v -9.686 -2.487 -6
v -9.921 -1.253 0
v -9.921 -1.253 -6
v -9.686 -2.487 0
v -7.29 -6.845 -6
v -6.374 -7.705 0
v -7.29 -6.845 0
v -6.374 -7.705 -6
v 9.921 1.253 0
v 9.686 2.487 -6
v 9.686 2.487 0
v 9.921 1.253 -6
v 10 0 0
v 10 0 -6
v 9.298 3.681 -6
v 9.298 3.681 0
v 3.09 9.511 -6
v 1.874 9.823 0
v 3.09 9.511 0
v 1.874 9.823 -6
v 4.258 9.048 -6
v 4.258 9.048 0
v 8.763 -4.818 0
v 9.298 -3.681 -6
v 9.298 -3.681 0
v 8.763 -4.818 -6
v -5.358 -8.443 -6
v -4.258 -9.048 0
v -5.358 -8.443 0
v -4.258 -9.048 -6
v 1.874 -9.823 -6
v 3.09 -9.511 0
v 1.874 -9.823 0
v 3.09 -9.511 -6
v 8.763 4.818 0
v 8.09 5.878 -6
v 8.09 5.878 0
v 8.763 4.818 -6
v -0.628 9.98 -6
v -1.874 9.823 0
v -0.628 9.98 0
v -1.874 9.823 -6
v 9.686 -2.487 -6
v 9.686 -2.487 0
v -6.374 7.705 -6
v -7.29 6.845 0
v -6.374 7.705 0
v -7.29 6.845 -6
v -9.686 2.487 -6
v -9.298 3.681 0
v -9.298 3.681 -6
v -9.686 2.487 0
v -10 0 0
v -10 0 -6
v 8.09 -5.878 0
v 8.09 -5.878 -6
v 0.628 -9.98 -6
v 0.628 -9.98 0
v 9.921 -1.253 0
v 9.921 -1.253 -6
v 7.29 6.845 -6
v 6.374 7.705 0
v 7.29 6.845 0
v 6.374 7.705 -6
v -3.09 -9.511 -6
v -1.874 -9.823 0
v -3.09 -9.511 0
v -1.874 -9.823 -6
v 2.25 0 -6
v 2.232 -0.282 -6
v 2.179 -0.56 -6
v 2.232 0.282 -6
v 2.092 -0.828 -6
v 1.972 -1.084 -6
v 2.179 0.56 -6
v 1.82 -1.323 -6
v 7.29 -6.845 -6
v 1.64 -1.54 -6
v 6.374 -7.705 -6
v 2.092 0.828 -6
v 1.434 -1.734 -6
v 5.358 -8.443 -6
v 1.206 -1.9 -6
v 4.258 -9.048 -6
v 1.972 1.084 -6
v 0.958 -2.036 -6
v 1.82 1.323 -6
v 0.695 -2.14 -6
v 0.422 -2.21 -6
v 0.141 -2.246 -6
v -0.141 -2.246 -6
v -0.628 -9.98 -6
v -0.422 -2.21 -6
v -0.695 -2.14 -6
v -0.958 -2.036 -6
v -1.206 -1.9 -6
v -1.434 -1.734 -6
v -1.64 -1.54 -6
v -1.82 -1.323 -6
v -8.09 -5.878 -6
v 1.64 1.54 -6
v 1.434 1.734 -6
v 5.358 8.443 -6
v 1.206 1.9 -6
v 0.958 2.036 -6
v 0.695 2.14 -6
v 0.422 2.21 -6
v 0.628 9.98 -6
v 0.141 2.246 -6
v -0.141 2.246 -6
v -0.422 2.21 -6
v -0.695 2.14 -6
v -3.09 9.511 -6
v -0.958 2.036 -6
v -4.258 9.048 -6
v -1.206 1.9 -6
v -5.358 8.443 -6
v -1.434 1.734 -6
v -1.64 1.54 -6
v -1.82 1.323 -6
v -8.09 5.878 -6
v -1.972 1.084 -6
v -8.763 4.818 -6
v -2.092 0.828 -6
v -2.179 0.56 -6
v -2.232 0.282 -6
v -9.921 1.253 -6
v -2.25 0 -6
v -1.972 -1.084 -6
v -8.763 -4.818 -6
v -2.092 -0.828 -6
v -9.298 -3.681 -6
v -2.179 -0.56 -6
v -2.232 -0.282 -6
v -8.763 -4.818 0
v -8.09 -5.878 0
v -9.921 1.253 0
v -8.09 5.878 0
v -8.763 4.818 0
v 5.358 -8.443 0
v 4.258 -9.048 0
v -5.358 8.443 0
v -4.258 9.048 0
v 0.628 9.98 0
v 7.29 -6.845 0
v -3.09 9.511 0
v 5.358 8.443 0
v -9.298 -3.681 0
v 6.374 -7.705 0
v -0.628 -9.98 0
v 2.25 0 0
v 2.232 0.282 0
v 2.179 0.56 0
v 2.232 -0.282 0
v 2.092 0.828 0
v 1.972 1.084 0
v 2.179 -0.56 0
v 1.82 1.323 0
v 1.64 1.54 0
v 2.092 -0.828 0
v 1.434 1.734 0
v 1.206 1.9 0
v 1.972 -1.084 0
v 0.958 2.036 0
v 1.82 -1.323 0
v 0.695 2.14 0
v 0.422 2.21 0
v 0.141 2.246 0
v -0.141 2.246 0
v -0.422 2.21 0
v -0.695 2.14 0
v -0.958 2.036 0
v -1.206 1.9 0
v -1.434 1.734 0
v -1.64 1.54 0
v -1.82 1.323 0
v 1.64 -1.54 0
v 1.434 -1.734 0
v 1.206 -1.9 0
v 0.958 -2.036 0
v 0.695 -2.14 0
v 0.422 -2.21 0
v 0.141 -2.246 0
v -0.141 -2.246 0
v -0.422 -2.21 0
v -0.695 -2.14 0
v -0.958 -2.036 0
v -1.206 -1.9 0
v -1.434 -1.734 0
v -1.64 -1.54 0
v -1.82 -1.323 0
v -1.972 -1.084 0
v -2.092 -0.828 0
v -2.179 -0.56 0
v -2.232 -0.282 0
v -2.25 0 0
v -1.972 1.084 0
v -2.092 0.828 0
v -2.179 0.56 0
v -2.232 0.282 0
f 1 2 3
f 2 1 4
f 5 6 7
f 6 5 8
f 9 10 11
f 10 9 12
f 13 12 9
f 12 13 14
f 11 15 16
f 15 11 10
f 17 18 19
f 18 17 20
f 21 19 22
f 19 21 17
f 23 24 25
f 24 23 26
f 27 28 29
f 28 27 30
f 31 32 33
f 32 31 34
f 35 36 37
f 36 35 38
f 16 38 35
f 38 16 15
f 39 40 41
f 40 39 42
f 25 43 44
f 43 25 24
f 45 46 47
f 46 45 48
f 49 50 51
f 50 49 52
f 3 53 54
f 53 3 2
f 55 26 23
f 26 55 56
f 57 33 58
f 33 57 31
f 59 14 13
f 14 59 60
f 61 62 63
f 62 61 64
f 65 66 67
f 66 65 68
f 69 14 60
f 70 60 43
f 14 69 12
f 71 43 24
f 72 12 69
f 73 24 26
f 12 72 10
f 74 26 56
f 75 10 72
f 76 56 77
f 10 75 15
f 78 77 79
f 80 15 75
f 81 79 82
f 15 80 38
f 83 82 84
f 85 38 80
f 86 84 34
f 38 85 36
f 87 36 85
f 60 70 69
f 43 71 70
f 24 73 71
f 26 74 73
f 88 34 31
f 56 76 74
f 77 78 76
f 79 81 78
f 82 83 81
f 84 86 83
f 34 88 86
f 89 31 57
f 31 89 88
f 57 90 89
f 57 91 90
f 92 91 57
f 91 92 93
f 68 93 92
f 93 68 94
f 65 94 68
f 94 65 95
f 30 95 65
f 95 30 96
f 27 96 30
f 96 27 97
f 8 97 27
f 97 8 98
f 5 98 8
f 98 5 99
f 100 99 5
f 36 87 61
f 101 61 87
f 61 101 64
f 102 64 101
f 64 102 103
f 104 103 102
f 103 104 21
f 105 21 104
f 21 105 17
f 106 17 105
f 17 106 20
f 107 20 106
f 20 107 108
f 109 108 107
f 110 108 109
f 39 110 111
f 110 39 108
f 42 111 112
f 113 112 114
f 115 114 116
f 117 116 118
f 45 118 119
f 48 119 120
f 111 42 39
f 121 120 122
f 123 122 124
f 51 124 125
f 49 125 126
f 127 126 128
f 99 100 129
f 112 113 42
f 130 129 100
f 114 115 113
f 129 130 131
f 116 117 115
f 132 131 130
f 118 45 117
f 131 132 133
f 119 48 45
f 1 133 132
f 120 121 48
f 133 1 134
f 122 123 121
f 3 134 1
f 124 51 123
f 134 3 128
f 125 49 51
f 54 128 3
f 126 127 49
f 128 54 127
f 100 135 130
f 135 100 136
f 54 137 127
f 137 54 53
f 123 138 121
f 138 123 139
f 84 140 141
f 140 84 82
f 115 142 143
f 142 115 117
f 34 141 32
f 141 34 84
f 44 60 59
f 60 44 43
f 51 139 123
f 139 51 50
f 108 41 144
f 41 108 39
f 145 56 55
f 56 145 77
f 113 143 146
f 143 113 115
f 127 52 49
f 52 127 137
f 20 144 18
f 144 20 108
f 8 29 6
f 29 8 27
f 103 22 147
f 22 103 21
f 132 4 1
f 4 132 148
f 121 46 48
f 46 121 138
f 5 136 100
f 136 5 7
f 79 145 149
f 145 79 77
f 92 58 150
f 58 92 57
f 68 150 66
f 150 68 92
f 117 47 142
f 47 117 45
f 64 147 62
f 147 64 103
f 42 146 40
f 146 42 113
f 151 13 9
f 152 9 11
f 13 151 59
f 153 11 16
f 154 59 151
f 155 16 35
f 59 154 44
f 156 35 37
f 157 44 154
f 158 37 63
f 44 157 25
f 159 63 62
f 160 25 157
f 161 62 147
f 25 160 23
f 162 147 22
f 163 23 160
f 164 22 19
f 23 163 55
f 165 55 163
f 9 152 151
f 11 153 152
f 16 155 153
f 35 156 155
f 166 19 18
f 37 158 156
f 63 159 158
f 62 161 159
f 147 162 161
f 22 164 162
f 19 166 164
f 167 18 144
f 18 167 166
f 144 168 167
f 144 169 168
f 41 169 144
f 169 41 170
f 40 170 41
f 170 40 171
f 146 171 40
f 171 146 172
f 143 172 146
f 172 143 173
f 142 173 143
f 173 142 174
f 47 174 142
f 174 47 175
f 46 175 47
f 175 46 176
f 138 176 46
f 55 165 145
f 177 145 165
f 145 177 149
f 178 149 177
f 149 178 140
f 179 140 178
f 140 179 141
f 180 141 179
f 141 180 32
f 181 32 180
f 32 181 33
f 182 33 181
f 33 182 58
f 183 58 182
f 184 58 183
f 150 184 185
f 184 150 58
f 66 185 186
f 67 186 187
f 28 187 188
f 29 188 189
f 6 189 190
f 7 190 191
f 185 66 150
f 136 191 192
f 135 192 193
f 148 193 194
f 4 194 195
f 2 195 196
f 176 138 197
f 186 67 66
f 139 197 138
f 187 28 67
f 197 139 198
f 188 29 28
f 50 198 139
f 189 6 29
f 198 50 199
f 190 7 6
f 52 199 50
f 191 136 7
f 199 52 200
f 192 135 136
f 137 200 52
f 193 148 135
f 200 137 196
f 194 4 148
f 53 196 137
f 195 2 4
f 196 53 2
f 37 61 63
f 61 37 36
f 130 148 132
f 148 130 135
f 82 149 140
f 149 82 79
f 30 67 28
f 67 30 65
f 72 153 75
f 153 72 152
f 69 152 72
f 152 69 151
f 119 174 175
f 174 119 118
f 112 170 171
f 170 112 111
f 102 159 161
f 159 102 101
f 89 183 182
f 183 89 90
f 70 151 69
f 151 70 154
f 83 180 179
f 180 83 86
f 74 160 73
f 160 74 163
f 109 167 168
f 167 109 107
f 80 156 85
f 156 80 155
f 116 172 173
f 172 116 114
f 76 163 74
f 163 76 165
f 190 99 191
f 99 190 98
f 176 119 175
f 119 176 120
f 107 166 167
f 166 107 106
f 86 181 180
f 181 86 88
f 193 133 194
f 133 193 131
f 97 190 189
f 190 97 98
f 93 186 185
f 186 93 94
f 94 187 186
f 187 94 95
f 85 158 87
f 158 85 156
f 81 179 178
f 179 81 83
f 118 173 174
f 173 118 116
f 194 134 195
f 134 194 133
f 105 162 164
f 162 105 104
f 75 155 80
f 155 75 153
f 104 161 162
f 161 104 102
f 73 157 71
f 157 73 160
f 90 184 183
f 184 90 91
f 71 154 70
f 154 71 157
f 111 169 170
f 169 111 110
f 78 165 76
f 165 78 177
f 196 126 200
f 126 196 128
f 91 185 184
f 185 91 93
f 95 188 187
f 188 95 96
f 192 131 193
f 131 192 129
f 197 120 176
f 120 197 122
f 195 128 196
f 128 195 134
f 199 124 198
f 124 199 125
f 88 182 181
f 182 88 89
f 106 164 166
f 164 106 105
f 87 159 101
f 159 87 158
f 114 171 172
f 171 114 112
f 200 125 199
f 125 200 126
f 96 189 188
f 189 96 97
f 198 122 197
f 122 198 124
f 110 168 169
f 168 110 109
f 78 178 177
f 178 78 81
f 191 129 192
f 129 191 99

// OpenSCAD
$fn = 50;


difference() {
	union() {
		translate(v = [0, 0, -6.0000000000]) {
			cylinder(h = 6, r = 10.0000000000);
		}
		cylinder(h = 0, r = 13.0000000000);
	}
	union() {
		#translate(v = [0, 0, -6]) {
			cylinder(h = 6, r = 2.2500000000);
		}
	}
}
